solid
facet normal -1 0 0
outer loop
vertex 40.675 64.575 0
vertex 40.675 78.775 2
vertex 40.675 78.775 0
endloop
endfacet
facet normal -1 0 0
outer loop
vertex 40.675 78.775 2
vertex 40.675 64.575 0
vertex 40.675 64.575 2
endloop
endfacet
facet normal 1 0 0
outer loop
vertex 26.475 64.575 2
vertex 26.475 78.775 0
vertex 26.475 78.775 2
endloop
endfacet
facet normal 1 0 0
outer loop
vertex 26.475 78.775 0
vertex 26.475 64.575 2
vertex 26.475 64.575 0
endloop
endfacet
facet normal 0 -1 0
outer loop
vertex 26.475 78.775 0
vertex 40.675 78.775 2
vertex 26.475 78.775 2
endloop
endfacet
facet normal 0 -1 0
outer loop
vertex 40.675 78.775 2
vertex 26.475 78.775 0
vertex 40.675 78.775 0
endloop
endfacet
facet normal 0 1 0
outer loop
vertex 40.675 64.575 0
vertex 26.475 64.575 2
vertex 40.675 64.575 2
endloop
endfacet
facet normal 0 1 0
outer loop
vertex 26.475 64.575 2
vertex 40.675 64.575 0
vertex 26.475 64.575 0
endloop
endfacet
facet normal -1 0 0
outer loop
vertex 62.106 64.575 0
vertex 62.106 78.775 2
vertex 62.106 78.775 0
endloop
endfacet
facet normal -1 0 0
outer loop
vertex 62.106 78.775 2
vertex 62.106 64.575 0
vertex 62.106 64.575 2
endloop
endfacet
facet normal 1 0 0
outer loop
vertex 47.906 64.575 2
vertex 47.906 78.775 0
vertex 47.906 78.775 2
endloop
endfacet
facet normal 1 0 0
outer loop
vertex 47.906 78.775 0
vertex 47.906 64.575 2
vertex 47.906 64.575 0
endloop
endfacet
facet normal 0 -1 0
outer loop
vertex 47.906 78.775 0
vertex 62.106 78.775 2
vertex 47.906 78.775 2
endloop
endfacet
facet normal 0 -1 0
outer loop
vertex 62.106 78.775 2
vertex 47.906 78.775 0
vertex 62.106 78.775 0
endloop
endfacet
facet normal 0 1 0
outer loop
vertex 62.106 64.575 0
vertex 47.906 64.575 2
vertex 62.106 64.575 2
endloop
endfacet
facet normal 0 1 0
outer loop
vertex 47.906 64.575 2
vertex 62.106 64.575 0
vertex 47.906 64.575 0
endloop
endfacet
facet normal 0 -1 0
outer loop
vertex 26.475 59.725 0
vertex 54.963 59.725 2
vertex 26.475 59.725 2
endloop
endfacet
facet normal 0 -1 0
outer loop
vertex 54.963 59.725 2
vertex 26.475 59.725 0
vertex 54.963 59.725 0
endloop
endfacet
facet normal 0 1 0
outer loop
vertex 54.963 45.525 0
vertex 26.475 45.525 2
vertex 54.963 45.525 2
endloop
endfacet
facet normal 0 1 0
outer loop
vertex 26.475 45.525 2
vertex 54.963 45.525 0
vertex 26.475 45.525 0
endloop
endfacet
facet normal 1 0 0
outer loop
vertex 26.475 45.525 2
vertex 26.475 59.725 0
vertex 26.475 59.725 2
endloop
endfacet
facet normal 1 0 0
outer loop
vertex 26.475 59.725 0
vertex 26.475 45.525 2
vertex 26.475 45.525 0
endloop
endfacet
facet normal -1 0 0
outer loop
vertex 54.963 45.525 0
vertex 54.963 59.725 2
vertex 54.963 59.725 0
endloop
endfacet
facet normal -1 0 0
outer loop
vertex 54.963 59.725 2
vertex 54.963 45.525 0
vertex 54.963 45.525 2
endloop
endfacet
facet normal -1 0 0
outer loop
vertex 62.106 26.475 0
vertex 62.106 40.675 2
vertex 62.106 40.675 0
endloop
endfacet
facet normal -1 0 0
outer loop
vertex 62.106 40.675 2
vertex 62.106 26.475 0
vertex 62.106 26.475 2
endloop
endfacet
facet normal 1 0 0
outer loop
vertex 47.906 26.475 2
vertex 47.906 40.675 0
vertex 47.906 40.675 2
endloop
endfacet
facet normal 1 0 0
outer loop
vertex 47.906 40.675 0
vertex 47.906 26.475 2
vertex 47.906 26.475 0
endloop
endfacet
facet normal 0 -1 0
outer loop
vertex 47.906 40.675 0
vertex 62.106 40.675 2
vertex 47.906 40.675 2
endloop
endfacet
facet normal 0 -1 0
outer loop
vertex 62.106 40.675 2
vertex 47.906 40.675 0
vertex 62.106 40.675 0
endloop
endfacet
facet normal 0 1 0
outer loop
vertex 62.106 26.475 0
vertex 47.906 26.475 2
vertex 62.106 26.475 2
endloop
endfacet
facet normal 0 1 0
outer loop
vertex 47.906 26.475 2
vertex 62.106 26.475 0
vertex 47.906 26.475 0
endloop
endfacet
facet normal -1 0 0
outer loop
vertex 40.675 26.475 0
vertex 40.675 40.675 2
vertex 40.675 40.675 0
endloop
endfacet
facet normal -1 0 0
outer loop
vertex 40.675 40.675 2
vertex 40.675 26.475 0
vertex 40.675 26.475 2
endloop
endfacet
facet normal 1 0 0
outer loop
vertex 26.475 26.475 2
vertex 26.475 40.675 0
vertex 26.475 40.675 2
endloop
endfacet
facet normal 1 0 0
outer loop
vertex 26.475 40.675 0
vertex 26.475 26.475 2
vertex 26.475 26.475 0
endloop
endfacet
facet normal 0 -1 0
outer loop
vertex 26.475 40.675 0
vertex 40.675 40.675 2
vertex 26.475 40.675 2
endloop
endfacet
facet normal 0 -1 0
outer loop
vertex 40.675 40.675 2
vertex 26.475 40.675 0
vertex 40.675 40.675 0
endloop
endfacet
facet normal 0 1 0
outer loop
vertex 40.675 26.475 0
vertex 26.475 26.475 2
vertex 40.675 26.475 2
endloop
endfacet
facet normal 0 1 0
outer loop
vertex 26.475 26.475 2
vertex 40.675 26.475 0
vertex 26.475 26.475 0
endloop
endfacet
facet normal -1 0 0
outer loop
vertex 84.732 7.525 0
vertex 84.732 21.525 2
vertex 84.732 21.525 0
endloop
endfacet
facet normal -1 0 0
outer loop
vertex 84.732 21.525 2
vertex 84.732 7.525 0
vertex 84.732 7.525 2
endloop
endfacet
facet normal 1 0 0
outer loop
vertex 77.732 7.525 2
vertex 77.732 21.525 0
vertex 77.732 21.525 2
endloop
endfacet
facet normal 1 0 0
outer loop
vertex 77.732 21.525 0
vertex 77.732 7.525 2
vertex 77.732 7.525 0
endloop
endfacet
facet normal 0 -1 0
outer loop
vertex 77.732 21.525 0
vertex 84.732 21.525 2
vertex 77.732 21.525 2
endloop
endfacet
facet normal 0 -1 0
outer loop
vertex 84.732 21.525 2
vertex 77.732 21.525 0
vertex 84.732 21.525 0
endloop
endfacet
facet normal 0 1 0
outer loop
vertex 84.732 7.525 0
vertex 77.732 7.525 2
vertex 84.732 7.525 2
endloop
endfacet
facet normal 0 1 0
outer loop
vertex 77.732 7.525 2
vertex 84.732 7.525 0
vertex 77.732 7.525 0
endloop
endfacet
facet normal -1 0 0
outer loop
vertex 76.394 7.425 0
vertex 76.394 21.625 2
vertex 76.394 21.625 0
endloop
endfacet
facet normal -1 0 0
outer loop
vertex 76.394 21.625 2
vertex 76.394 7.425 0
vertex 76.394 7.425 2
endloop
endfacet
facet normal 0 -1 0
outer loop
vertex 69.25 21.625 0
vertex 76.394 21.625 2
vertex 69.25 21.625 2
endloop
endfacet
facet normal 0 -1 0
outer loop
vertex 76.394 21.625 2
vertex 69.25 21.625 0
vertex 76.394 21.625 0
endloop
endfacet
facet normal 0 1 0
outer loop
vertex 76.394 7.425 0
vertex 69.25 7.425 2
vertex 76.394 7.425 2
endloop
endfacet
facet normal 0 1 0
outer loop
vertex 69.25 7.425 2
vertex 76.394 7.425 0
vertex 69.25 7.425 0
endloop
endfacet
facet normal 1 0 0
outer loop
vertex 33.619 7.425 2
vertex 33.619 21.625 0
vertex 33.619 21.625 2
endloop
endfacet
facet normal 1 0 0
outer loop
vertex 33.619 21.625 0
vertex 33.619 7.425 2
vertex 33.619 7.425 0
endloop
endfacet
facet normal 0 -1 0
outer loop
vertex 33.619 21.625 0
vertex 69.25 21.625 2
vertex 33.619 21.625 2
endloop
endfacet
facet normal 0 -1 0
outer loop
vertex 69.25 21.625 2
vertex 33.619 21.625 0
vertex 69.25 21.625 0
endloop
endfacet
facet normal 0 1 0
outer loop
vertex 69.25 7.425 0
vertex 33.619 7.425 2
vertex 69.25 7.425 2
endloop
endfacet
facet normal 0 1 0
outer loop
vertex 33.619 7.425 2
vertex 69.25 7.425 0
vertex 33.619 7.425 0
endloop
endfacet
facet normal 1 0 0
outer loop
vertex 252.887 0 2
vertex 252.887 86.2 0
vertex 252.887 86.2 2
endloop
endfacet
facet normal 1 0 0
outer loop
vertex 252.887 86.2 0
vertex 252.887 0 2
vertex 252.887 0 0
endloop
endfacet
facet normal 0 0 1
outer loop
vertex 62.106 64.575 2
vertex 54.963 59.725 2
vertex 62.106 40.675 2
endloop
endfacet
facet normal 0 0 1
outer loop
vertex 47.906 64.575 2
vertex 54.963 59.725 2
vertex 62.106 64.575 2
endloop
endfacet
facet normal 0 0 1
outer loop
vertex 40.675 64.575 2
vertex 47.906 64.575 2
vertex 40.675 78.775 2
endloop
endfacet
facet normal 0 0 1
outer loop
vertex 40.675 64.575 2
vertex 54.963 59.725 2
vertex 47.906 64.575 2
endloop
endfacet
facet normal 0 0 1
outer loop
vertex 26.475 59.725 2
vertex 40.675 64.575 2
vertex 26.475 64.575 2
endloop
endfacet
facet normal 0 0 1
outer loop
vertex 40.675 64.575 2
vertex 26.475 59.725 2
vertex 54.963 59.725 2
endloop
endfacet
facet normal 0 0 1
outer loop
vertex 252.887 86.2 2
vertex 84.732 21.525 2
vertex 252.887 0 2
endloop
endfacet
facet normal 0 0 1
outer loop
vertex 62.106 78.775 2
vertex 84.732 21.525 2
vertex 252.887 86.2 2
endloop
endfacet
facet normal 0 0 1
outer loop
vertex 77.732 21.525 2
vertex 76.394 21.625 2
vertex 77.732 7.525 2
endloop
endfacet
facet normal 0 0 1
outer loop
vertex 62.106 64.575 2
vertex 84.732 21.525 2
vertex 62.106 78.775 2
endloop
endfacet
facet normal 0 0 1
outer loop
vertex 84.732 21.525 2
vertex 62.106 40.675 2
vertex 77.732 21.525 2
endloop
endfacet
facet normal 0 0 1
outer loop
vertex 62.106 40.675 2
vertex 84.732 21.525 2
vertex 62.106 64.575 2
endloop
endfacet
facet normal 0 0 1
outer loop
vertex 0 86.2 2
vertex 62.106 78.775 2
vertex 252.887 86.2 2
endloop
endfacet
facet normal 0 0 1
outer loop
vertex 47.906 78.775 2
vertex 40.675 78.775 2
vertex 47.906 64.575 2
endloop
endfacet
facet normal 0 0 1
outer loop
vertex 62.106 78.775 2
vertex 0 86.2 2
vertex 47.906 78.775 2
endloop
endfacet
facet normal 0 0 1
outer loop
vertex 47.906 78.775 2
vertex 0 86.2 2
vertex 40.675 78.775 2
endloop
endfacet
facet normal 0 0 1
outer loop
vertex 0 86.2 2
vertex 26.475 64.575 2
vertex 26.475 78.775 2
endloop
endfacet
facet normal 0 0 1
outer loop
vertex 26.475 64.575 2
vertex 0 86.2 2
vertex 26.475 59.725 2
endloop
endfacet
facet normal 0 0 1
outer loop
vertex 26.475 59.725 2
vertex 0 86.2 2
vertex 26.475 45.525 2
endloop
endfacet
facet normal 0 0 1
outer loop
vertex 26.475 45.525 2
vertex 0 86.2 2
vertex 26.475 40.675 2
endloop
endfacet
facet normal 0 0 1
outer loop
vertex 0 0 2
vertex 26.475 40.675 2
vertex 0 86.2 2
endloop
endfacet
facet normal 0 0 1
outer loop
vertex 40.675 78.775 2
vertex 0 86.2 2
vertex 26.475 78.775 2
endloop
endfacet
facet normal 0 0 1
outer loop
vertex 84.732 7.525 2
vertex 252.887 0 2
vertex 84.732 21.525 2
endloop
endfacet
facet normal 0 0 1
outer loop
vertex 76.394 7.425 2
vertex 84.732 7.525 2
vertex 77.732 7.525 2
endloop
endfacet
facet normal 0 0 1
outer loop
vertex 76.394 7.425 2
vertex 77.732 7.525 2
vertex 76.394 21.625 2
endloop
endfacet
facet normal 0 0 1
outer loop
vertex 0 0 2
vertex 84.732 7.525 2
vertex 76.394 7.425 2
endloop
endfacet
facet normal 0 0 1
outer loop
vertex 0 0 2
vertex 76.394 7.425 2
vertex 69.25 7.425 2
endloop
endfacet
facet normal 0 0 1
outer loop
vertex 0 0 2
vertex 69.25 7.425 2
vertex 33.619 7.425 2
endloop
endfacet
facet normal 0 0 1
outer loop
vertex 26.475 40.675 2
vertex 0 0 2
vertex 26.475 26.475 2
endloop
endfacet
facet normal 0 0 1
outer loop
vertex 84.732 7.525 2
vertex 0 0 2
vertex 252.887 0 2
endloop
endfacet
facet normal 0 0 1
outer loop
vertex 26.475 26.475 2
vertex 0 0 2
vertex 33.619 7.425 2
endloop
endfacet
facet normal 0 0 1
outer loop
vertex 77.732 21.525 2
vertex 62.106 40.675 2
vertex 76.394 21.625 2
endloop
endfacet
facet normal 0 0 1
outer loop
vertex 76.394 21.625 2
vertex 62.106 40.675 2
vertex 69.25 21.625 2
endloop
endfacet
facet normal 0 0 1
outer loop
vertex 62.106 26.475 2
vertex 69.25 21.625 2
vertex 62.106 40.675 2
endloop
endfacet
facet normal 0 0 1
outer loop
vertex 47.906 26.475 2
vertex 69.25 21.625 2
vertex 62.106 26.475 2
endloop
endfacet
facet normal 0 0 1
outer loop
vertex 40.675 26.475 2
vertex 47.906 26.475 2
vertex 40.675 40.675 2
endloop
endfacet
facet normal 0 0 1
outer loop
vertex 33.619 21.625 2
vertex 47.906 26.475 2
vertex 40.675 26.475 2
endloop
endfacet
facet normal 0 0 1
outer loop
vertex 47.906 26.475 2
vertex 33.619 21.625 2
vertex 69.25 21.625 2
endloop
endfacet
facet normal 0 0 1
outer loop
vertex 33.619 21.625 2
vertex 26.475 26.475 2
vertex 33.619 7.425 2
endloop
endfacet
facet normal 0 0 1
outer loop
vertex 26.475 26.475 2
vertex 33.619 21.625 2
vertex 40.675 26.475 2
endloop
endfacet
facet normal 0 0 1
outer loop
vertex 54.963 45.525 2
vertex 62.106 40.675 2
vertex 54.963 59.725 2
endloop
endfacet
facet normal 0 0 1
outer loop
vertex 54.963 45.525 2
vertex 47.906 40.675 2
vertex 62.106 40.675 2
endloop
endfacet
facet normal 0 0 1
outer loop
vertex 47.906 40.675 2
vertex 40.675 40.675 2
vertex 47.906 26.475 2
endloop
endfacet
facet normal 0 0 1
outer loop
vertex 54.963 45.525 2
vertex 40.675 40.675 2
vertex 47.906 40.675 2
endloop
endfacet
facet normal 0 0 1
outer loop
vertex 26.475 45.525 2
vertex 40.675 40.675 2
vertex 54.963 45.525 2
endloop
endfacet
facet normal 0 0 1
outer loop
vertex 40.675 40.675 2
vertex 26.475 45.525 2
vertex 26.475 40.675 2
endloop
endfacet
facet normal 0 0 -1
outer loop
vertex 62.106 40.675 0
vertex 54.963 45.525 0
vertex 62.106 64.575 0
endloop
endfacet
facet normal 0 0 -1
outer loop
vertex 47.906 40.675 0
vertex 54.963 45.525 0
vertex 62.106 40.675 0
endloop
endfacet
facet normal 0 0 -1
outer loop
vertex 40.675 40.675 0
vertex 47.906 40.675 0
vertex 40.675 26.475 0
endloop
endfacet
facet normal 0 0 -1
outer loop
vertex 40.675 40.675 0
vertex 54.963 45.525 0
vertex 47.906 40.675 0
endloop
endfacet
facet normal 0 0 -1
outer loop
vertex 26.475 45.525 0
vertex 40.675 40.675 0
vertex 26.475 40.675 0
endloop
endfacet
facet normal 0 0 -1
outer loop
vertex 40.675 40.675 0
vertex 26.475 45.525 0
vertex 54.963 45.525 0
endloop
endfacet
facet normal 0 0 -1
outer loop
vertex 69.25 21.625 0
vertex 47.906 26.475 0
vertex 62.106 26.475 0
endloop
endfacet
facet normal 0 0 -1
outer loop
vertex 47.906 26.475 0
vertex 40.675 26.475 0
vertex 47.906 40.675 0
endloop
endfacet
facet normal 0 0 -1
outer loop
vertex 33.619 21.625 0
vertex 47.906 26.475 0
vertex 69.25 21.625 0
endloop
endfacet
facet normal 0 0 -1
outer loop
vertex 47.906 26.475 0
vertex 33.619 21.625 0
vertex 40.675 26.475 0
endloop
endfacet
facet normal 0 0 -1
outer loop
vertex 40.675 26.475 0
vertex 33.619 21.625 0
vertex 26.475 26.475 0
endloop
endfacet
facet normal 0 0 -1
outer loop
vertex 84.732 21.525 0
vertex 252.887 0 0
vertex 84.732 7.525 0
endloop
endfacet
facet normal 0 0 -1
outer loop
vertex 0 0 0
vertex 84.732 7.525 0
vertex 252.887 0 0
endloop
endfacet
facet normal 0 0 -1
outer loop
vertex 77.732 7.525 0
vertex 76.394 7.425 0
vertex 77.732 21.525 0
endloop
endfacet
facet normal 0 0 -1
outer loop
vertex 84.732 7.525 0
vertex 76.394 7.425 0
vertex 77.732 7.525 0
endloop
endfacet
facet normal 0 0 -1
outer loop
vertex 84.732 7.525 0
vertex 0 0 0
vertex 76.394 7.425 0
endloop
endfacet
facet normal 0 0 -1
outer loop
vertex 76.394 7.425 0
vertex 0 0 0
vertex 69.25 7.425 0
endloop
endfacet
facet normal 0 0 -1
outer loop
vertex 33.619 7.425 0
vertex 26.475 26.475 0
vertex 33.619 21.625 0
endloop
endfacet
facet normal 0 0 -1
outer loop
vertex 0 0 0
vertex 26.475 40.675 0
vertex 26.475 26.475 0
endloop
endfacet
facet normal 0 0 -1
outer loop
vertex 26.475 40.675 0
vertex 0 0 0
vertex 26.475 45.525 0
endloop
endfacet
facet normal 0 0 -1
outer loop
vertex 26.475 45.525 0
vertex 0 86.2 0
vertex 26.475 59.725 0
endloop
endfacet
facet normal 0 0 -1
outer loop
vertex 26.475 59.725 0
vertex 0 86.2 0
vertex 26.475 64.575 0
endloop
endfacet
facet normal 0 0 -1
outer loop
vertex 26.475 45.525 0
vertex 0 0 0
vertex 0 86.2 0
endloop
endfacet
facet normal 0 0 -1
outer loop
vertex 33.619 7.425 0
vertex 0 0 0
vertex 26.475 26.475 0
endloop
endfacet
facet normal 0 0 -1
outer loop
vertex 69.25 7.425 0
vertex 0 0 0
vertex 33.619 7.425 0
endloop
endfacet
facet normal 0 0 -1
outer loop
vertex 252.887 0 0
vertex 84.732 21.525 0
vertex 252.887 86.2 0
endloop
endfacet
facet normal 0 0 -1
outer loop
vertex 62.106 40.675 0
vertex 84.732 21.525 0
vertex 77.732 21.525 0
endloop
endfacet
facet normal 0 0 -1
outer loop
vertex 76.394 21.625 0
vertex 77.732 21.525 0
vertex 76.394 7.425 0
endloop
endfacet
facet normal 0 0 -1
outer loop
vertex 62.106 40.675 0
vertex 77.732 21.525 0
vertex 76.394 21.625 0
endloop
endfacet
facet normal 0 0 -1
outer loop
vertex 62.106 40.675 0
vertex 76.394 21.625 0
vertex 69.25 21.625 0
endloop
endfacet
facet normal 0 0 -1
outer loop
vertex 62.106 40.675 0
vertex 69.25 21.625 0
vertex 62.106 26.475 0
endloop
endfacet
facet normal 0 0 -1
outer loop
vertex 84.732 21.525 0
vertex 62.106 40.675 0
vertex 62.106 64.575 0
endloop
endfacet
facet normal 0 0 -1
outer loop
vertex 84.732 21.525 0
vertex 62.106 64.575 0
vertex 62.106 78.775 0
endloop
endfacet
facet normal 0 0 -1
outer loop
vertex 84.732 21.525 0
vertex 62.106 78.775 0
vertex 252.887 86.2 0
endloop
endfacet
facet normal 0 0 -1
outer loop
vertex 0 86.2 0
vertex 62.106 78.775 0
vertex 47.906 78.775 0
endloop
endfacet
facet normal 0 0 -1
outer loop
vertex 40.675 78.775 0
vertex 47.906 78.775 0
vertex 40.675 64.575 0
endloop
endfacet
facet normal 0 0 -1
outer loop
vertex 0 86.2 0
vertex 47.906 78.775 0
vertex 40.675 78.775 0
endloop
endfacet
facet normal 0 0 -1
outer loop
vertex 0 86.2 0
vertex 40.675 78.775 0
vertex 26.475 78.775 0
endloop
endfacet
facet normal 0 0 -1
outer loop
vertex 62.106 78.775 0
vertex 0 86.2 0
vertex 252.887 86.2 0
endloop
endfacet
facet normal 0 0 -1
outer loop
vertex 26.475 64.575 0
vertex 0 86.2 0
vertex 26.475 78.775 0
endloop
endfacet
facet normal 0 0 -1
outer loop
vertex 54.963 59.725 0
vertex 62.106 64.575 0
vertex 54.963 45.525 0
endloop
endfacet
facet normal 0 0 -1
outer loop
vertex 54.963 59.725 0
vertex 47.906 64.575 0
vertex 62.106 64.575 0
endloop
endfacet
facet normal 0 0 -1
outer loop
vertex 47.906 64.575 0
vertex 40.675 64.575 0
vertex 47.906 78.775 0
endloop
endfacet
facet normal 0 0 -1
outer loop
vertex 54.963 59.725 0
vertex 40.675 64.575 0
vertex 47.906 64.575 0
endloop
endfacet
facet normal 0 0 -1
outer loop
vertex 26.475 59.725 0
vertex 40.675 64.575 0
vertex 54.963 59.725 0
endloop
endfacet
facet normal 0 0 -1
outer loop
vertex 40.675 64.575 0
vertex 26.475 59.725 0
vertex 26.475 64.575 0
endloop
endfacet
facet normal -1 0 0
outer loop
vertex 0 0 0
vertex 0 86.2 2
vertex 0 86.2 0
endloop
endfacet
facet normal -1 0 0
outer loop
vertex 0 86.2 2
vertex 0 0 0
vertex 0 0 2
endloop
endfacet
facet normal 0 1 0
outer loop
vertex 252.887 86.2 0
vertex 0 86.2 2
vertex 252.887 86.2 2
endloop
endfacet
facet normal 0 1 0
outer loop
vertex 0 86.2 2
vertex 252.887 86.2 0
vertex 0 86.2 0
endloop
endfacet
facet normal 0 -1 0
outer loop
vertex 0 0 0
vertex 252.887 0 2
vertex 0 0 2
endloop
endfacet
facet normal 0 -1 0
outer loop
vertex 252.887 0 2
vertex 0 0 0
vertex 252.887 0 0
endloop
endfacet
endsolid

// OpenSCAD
// MV-44 (MiniVan) Keyboard Plate
// THEVAN MV-44 Standard Layout (12.75u, 44 keys)
// For Cherry MX compatible switches
// Optimized for 3D printing

// ========================================
// Parameters
// ========================================

// Key unit (standard keyboard spacing)
unit = 19.05;  // 1u = 19.05mm

// Switch hole dimensions (3D print adjusted)
switch_hole_size = 14.2;  // 14mm + 0.2mm tolerance

// Plate thickness
plate_thickness = 2.0;  // Thicker for 3D print strength

// Plate margin (around the keys)
plate_margin = 5;  // mm from edge of outermost keys

// Stabilizer dimensions (Cherry style, 3D print adjusted)
stab_hole_width = 7.0;   // 6.75mm + tolerance
stab_hole_length = 14.0; // ~14mm for wire clearance
stab_spacing_2u = 11.938;    // Distance from switch center to stab center (2u)
stab_spacing_225u = 11.938;  // Same spacing for 2.25u

// Layout dimensions
layout_width_u = 12.75;  // Total width in units
layout_rows = 4;         // Number of rows

// Calculated dimensions
plate_width = layout_width_u * unit + plate_margin * 2;
plate_height = layout_rows * unit + plate_margin * 2;

// Display settings
show_debug_grid = false;  // Show unit grid for debugging

// ========================================
// Row layouts (key sizes in units)
// ========================================

// Row 1: Tab + 10 alpha + Backspace
row1_keys = [1, 1, 1, 1, 1, 1, 1, 1, 1, 1, 1, 1.75];

// Row 2: Fn + 10 alpha + Enter
row2_keys = [1.25, 1, 1, 1, 1, 1, 1, 1, 1, 1, 1, 1.5];

// Row 3: Shift + 10 alpha + Shift
row3_keys = [1.75, 1, 1, 1, 1, 1, 1, 1, 1, 1, 1, 1];

// Row 4: Ctrl + Fn + Alt + Space(2.25) + Space(2) + Alt + Fn + Ctrl
row4_keys = [1.25, 1.5, 1.25, 2.25, 2, 1.25, 1.5, 1.75];

// Keys that need stabilizers (size >= 2u)
row4_stab_indices = [3];  // Index 3 = 2.25u spacebar

// ========================================
// Modules
// ========================================

// Single switch hole
module switch_hole() {
    cube([switch_hole_size, switch_hole_size, plate_thickness + 2], center = true);
}

// Stabilizer cutout for a given key size
// size: key size in units (2, 2.25, etc.)
module stabilizer_cutout(size) {
    // Calculate stabilizer spacing based on key size
    spacing = (size == 2) ? stab_spacing_2u : stab_spacing_225u;

    // Left stabilizer hole
    translate([-spacing, 0, 0])
        cube([stab_hole_width, stab_hole_length, plate_thickness + 2], center = true);

    // Right stabilizer hole
    translate([spacing, 0, 0])
        cube([stab_hole_width, stab_hole_length, plate_thickness + 2], center = true);
}

// Place a key at position (x_offset in units, row number 0-3)
// key_size: width of key in units
// with_stab: add stabilizer cutout
module place_key(x_offset, row, key_size, with_stab = false) {
    // Calculate center position
    // x_offset is the left edge of the key in units
    // Add half the key size to get center
    x_pos = plate_margin + (x_offset + key_size / 2) * unit;
    y_pos = plate_margin + (layout_rows - 1 - row + 0.5) * unit;  // Row 0 at top

    translate([x_pos, y_pos, plate_thickness / 2]) {
        switch_hole();
        if (with_stab && key_size >= 2) {
            stabilizer_cutout(key_size);
        }
    }
}

// Place a row of keys
// keys: array of key sizes
// row: row number (0-3, 0 = top)
// stab_indices: array of indices that need stabilizers
module place_row(keys, row, stab_indices = []) {
    x_offset = 0;
    for (i = [0 : len(keys) - 1]) {
        has_stab = len(search(i, stab_indices)) > 0;
        place_key(x_offset, row, keys[i], has_stab);
        x_offset = x_offset + keys[i];
    }
}

// All switch holes and stabilizer cutouts
module all_cutouts() {
    // Row 1 (top)
    place_row(row1_keys, 0);

    // Row 2
    place_row(row2_keys, 1);

    // Row 3
    place_row(row3_keys, 2);

    // Row 4 (bottom) with stabilizers
    place_row(row4_keys, 3, row4_stab_indices);
}

// Plate outline
module plate_outline() {
    cube([plate_width, plate_height, plate_thickness]);
}

// Complete plate
module mv44_plate() {
    difference() {
        plate_outline();
        all_cutouts();
    }
}

// Debug: show unit grid
module debug_grid() {
    if (show_debug_grid) {
        for (x = [0 : layout_width_u]) {
            translate([plate_margin + x * unit, 0, plate_thickness])
                %cube([0.5, plate_height, 1]);
        }
        for (y = [0 : layout_rows]) {
            translate([0, plate_margin + y * unit, plate_thickness])
                %cube([plate_width, 0.5, 1]);
        }
    }
}

// ========================================
// Render
// ========================================

mv44_plate();
debug_grid();

// ========================================
// Debug info
// ========================================

echo("=== MV-44 Plate Dimensions ===");
echo(str("Plate width: ", plate_width, " mm"));
echo(str("Plate height: ", plate_height, " mm"));
echo(str("Plate thickness: ", plate_thickness, " mm"));
echo(str("Total keys: ", len(row1_keys) + len(row2_keys) + len(row3_keys) + len(row4_keys)));
